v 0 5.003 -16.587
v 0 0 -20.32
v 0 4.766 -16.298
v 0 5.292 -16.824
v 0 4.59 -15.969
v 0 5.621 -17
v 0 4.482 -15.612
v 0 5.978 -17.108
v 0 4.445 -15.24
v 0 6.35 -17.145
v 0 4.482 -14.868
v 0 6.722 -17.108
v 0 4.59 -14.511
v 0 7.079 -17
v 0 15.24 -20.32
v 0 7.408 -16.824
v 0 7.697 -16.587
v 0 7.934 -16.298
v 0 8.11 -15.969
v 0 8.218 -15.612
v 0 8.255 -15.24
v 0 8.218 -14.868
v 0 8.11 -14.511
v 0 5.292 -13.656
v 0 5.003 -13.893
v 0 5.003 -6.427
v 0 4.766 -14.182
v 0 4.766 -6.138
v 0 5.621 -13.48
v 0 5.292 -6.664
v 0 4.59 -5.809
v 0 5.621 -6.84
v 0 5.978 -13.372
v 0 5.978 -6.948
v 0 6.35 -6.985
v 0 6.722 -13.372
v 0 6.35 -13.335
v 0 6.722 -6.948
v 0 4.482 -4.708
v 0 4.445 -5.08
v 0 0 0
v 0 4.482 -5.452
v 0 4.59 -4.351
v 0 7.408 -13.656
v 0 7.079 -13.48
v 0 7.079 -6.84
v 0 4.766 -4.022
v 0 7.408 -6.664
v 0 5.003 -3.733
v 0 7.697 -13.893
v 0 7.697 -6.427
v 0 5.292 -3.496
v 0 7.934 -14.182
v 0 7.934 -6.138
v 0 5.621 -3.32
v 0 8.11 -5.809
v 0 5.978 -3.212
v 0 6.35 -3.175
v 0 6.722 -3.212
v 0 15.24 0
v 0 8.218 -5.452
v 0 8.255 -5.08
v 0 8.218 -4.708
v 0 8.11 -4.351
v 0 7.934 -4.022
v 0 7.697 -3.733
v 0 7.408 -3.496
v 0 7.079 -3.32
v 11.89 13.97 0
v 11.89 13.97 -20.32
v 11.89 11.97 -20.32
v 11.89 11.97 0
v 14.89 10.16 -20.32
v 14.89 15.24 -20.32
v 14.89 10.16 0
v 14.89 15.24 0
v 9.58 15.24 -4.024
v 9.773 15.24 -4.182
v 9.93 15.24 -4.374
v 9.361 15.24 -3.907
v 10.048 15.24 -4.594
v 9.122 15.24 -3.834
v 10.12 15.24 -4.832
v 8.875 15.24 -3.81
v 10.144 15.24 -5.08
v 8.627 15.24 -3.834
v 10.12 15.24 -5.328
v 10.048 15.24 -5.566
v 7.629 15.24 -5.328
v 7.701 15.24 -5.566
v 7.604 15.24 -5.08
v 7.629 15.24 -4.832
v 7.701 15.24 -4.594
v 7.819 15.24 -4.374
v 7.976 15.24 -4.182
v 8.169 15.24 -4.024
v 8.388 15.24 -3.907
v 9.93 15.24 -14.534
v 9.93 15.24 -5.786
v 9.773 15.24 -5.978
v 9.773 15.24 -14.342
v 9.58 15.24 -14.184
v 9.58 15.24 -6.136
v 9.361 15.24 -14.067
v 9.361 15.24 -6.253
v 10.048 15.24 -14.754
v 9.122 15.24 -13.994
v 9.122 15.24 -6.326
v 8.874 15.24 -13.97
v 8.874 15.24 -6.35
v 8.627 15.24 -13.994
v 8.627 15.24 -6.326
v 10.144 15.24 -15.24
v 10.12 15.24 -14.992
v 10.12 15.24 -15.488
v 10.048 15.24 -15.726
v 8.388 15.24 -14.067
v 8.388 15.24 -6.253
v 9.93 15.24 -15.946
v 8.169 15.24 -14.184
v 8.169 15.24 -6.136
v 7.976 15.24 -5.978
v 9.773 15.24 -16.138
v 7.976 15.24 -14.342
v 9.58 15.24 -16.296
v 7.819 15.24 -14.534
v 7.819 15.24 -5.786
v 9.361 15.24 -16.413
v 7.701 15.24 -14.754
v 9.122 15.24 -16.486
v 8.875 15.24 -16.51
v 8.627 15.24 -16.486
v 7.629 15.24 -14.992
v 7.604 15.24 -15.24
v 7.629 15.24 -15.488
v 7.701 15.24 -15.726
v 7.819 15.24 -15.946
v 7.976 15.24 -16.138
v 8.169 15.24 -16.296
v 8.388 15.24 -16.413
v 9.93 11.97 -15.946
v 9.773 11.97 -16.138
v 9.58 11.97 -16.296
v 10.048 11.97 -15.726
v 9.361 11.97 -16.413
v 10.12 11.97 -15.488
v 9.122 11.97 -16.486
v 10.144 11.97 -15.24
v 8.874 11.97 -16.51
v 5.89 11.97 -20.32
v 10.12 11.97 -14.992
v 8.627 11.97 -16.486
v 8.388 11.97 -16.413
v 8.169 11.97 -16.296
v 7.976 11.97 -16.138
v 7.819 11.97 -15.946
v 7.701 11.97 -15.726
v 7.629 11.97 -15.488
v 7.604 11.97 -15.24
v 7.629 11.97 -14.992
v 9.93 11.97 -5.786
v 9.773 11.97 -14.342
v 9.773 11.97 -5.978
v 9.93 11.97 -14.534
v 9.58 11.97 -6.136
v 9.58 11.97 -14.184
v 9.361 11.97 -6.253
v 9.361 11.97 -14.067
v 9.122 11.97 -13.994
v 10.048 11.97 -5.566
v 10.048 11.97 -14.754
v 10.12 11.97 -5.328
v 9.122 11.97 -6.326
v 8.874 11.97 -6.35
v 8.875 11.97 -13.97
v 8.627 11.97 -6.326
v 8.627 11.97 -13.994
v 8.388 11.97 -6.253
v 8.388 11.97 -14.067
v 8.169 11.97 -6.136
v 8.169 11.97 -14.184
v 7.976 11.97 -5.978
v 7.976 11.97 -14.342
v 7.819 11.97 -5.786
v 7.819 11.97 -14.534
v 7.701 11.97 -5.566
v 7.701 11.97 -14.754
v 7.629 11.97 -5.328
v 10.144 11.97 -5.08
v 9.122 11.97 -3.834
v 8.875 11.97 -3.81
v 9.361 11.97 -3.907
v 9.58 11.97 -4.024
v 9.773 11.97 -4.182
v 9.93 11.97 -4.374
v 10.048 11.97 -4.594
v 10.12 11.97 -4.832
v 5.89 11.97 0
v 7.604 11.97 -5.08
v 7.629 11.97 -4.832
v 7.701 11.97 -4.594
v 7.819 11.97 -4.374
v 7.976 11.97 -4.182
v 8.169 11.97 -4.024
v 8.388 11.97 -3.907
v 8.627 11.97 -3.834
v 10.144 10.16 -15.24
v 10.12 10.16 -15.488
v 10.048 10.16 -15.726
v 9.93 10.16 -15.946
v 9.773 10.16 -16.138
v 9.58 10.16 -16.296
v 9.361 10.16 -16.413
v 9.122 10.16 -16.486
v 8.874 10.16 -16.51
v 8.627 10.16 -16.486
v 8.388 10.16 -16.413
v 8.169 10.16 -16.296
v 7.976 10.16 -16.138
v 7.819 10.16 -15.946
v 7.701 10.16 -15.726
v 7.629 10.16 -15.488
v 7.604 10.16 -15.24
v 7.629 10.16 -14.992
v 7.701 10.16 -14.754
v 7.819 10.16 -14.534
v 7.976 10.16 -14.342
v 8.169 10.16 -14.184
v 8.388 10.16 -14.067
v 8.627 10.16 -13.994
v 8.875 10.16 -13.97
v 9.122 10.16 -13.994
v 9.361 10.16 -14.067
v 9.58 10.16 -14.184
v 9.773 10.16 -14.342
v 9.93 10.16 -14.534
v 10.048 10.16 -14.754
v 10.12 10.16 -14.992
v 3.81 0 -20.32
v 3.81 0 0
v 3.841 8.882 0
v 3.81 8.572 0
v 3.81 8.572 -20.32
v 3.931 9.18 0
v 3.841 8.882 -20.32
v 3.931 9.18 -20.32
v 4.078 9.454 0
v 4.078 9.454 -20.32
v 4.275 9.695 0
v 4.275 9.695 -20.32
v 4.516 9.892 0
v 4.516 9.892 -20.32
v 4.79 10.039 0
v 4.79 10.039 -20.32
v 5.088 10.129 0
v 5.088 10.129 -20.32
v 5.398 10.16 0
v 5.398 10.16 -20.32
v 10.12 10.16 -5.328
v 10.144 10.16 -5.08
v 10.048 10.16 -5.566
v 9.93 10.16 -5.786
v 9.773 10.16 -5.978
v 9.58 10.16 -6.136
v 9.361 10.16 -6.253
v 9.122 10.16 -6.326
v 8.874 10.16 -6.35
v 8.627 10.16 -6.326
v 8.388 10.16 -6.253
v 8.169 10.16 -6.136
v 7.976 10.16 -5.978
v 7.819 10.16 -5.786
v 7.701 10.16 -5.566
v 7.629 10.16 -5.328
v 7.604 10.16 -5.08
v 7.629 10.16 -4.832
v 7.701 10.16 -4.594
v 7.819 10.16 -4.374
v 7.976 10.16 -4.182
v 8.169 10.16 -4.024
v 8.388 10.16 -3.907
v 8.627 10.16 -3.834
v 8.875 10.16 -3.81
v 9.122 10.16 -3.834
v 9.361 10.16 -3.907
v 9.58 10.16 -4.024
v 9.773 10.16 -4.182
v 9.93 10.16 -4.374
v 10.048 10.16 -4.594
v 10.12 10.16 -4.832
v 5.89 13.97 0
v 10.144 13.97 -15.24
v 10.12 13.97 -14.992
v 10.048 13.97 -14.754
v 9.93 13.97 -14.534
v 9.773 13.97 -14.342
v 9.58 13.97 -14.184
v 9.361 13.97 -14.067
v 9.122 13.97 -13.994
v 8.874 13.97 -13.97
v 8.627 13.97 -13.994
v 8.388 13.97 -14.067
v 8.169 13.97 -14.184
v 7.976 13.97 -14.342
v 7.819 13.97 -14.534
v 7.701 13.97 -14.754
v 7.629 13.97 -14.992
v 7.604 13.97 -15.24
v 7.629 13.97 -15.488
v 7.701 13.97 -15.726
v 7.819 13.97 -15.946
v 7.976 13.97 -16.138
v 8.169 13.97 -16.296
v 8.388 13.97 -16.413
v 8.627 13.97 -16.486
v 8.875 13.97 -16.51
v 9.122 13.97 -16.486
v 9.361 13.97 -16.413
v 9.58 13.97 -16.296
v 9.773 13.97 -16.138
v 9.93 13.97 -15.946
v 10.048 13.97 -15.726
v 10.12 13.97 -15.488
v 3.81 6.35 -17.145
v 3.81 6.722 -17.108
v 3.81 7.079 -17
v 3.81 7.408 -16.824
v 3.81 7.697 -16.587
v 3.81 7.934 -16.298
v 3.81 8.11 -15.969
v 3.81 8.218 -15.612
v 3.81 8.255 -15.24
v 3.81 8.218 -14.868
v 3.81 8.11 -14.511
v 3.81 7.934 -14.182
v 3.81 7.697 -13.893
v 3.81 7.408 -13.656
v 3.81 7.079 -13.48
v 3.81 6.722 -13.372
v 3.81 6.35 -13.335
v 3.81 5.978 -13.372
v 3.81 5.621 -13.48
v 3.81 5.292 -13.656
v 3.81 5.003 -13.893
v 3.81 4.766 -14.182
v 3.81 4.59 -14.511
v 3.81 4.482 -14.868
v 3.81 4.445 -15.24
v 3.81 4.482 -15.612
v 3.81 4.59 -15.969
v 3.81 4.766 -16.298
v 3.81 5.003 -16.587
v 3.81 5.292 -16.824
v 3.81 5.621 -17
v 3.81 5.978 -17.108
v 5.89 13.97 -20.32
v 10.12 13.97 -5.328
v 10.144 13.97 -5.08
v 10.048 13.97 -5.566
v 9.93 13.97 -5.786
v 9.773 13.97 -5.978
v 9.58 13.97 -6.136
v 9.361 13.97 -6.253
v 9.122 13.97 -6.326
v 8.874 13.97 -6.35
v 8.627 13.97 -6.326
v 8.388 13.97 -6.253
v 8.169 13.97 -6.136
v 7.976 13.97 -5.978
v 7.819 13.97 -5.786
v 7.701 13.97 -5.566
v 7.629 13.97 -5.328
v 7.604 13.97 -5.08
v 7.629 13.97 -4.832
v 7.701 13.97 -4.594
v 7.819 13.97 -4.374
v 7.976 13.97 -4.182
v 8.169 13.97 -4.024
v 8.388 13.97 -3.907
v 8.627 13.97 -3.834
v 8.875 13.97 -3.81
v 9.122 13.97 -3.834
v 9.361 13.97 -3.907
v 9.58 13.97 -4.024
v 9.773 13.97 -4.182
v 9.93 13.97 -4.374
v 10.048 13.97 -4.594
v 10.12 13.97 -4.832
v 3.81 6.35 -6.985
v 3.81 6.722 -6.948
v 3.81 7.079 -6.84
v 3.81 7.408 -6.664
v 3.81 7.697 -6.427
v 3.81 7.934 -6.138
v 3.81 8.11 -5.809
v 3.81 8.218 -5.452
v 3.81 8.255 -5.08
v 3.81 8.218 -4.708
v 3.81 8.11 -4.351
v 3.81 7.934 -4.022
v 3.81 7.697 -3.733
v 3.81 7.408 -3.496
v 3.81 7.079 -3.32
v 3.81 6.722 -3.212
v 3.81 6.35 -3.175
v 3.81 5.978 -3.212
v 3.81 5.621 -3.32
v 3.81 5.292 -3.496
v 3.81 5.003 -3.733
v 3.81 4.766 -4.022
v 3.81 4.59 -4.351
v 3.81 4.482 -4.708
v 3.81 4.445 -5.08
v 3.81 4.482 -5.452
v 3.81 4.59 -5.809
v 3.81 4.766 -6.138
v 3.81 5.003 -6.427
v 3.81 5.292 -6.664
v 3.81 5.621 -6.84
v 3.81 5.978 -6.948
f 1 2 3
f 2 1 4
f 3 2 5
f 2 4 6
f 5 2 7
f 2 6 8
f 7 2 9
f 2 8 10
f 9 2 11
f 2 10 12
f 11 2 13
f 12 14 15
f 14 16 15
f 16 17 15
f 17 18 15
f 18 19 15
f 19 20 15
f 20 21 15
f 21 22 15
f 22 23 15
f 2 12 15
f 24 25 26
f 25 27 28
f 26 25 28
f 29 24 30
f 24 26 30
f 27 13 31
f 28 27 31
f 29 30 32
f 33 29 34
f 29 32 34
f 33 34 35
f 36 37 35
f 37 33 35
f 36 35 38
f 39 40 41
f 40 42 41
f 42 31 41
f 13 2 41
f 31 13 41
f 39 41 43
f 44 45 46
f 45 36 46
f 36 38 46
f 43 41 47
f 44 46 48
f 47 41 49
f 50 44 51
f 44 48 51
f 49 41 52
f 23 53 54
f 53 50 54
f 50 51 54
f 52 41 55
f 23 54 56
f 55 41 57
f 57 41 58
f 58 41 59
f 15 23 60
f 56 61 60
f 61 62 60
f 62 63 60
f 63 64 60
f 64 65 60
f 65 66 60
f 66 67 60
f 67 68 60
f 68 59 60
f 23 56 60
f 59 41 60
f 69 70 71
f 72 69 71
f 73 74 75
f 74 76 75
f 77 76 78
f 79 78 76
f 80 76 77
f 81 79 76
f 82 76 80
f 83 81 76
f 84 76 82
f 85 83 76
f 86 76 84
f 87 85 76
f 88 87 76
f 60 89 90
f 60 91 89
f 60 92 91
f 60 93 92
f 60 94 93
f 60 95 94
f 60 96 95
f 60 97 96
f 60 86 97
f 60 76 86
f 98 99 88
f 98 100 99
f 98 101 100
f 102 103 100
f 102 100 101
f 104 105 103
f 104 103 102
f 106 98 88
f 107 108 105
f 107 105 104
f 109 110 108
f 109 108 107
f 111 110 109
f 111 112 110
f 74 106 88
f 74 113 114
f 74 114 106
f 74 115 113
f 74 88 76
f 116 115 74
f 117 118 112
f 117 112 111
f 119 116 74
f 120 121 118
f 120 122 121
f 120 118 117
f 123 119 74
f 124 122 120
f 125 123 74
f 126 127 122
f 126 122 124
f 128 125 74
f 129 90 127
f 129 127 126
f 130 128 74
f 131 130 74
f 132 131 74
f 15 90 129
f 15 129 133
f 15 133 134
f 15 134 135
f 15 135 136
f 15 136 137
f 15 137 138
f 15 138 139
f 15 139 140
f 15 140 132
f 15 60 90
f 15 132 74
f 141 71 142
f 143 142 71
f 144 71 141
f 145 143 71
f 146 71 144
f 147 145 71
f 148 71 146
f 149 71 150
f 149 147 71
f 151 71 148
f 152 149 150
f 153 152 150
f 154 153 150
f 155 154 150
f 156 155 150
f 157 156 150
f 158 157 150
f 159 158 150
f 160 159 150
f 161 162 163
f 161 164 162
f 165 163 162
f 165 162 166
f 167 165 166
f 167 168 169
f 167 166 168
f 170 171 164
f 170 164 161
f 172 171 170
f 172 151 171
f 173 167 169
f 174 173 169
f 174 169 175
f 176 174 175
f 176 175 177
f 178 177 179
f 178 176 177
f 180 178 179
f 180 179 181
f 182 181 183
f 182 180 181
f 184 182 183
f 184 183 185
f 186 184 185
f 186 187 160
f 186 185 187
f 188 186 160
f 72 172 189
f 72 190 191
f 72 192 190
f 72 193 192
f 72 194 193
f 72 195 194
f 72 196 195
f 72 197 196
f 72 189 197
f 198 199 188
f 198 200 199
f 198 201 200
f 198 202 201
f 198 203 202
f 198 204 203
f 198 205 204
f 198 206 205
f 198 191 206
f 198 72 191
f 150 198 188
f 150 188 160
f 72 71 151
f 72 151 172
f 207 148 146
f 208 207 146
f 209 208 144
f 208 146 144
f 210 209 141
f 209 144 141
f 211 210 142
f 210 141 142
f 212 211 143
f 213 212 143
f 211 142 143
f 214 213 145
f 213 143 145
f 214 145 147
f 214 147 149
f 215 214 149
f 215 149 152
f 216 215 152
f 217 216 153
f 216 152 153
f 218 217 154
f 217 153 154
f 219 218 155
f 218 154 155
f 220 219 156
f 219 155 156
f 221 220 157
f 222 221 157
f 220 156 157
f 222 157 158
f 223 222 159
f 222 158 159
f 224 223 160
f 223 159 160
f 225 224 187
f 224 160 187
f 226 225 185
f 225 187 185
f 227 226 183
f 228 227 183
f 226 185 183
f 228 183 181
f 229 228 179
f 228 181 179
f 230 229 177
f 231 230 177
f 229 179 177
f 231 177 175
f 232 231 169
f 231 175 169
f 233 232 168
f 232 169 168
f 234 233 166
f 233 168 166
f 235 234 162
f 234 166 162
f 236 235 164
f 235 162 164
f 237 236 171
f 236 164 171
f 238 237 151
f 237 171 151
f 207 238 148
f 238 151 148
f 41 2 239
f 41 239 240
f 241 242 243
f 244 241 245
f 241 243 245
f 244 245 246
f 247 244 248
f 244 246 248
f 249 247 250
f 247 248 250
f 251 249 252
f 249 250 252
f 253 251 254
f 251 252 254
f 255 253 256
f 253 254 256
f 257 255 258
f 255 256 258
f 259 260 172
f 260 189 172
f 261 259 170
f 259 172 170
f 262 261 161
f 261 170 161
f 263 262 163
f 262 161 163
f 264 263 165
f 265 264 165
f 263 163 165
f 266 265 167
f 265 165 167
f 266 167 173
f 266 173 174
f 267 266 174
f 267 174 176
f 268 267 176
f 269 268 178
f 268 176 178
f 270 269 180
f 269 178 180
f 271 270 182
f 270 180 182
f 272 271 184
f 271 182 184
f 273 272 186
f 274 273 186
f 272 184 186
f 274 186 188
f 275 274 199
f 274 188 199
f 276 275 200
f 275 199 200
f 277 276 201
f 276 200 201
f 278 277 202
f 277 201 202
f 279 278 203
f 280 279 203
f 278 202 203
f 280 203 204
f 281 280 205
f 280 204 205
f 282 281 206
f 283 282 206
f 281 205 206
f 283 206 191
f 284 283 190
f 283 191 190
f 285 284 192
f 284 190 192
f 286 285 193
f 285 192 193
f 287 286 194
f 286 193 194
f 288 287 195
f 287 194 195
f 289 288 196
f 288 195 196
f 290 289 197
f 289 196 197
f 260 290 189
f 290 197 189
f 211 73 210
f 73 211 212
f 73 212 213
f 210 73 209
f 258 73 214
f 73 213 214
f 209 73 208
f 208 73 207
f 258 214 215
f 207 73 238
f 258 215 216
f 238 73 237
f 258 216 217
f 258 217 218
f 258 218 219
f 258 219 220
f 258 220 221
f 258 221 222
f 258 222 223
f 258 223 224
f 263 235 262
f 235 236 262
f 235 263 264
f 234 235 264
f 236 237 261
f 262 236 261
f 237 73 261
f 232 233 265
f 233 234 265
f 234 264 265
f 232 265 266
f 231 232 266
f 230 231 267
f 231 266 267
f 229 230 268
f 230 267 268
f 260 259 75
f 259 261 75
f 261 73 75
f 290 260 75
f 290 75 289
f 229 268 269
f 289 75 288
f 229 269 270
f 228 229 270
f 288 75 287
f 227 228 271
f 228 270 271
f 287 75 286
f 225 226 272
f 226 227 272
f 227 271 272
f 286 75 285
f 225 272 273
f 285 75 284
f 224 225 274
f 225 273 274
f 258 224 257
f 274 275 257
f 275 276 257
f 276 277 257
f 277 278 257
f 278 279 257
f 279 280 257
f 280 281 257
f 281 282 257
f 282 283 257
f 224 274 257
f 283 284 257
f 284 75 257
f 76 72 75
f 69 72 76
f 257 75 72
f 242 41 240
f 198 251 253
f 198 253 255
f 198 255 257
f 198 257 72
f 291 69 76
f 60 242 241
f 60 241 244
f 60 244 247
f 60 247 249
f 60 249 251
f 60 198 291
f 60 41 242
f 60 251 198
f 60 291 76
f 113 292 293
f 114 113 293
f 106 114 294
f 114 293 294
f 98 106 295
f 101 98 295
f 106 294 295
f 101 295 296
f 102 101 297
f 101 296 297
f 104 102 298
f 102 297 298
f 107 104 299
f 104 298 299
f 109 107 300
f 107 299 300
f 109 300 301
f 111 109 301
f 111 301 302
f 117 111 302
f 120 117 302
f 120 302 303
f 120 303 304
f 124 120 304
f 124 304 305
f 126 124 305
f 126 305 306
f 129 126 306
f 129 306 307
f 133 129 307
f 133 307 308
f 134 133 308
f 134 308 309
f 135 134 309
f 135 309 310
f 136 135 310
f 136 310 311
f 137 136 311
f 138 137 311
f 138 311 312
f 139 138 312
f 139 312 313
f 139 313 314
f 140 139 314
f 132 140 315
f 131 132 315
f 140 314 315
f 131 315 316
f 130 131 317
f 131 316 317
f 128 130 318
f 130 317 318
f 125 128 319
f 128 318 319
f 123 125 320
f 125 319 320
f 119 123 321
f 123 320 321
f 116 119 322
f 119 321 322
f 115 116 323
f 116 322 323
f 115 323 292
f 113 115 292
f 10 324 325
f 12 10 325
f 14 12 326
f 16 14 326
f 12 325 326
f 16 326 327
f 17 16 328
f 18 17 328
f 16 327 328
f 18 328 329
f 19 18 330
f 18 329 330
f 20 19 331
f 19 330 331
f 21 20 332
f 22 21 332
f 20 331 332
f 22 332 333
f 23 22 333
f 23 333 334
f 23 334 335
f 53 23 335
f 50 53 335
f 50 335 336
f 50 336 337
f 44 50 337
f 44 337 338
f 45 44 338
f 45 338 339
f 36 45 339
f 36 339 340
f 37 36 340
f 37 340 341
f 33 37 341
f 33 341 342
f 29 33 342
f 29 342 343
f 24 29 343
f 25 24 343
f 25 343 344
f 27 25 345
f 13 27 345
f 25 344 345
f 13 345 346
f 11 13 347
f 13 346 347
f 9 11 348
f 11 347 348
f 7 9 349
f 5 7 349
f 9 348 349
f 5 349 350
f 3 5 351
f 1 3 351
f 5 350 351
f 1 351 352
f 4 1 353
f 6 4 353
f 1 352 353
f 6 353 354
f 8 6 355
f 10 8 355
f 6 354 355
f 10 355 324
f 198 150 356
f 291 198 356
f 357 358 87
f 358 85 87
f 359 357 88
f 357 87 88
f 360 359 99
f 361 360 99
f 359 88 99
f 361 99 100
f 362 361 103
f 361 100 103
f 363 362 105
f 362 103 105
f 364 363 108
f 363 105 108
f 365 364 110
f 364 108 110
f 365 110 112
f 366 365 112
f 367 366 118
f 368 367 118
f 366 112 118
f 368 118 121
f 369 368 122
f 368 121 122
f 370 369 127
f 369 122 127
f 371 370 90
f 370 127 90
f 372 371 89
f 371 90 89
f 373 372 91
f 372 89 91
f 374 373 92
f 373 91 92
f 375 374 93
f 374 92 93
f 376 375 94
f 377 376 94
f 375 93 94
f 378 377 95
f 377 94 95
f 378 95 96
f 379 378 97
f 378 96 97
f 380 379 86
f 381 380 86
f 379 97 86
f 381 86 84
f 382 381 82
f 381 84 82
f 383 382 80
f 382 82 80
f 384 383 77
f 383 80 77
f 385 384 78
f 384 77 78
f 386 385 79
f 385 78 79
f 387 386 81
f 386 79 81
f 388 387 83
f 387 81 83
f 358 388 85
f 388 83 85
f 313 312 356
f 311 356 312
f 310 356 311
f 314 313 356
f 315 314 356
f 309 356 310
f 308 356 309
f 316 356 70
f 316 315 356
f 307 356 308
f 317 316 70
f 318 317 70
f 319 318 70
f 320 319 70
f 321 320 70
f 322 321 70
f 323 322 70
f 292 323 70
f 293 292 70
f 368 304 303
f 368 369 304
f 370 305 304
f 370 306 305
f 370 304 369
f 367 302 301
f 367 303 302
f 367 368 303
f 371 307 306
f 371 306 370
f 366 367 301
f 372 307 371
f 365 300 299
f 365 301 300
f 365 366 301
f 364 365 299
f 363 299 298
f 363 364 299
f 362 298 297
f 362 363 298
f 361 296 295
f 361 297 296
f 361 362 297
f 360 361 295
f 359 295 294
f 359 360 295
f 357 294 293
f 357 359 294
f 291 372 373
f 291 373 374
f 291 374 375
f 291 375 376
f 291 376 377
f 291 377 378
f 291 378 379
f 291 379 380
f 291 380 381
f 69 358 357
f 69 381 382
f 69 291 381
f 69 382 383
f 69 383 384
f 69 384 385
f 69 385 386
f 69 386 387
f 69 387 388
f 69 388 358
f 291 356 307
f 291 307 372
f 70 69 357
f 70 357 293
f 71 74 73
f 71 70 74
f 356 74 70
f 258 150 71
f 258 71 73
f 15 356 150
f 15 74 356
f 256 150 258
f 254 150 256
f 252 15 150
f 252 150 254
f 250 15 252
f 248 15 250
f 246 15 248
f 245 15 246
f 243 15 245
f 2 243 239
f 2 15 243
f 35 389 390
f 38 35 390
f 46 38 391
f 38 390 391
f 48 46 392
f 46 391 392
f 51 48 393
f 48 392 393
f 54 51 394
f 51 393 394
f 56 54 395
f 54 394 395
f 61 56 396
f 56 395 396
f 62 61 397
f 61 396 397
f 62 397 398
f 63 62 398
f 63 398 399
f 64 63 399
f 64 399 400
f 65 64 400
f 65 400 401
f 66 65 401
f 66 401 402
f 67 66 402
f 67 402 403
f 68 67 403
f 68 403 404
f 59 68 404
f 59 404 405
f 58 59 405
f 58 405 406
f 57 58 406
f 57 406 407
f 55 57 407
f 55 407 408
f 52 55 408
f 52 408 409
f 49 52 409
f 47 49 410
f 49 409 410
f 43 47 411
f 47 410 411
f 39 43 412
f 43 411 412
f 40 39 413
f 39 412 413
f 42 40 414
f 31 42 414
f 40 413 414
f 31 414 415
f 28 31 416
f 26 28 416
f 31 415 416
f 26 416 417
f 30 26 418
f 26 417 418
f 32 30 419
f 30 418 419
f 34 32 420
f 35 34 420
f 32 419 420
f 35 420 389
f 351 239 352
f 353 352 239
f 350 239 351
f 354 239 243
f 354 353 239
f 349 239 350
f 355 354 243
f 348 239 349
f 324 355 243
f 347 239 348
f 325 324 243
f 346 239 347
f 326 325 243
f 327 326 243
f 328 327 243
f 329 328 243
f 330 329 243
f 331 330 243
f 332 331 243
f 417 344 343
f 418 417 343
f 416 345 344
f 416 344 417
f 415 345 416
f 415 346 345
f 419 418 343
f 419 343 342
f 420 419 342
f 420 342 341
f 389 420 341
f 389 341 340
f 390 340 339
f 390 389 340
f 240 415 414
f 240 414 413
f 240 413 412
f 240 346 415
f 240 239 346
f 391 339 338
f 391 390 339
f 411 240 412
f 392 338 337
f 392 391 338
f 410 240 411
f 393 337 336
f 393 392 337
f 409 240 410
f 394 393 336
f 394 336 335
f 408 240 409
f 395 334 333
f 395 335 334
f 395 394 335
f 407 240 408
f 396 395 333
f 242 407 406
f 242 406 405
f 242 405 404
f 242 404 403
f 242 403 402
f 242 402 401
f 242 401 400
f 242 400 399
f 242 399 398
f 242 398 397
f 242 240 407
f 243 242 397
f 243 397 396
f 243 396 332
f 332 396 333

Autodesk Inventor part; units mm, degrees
ref_plane "YZ Plane" through (0, 0, 0) normal (1, 0, 0) x (0, 1, 0)
ref_plane "XZ Plane" through (0, 0, 0) normal (0, 1, 0) x (-1, 0, 0)
ref_plane "XY Plane" through (0, 0, 0) normal (0, 0, 1) x (1, 0, 0)
sketch "Sketch1" plane through (0, 0, 0) normal (1, 0, 0) x (0, 1, 0)
  line L0 (0, 0) -> (15.24, 0)
  line L1 (15.24, 0) -> (15.24, -20.32)
  line L2 (15.24, -20.32) -> (0, -20.32)
  line L3 (0, -20.32) -> (0, 0)
  dimension "d0" = 15.24
  dimension "d1" = 20.32
extrude "Extrusion1" add sketch "Sketch1" along normal blind 3.81
sketch "Sketch2" plane through (0, 0, 0) normal (0, 0, 1) x (1, 0, 0)
  line L0 (3.81, 15.24) -> (8.89, 15.24)
  line L1 (8.89, 15.24) -> (14.89, 15.24)
  line L2 (14.89, 15.24) -> (14.89, 10.16)
  line L3 (14.89, 10.16) -> (3.81, 10.16)
  line L4 (3.81, 15.24) -> (3.81, 0) projected
  line L5 (8.89, 12.9701) -> (11.89, 12.9701)
  line L6 (11.89, 12.9701) -> (11.89, 11.9701)
  line L7 (11.89, 11.9701) -> (5.89, 11.9701)
  line L8 (5.89, 11.9701) -> (5.89, 12.9701)
  line L9 (5.89, 12.9701) -> (5.89, 13.9701)
  line L10 (5.89, 13.9701) -> (11.89, 13.9701)
  line L11 (11.89, 13.9701) -> (11.89, 12.9701)
  line L12 (3.81, 15.24) -> (3.81, 10.16)
  line L13 (0, 12.9701) -> (3.81, 12.9701)
  line L14 (5.89, 12.9701) -> (8.89, 12.9701)
  point P0 (0, 0)
  point P1 (0, 15.24)
  dimension "d4" = 8.89
  dimension "d5" = 6
  dimension "d6" = 5.08
  dimension "d7" = 8.89
  dimension "d8" = 3
  dimension "d9" = 1
  dimension "d10" = 6
  dimension "d11" = 1
extrude "Extrusion2" add sketch "Sketch2" against normal blind 20.32
sketch "Sketch3" plane through (5.89, 11.9701, 0) normal (0, 1, 0) x (1, 0, 0)
  line L0 (0, 0) -> (0, 5.08)
  line L1 (0, 0) -> (0, 20.32) projected
  line L2 (0, 5.08) -> (2.9845, 5.08)
  line L3 (6, 0) -> (6, 20.32) projected
  circle A0 centre (2.9845, 5.08) radius 1.27
  line L4 (-2.08, 0) -> (-2.08, 10.16)
  line L5 (-2.08, 0) -> (-2.08, 20.32) projected
  line L6 (-2.08, 10.16) -> (2.0052, 10.16)
  circle A1 centre (2.9845, 15.24) radius 1.27
  point P0 (-5.89, 0)
  dimension "d14" = 5.08
  dimension "d15" = 2.9845
  dimension "d16" = 2.54
  dimension "d17" = 10.16
extrude "Extrusion3" cut sketch "Sketch3" along normal mid plane 20.32
sketch "Sketch4" plane through (3.81, 0, 0) normal (1, 0, 0) x (0, 0, -1)
  line L0 (0, 0) -> (0, 6.35)
  line L1 (0, 10.16) -> (0, 0) projected
  line L2 (0, 6.35) -> (5.08, 6.35)
  circle A0 centre (5.08, 6.35) radius 1.905
  line L3 (0, 0) -> (10.16, 0)
  line L4 (0, 0) -> (20.32, 0) projected
  line L5 (10.16, 0) -> (10.16, 4.445)
  circle A1 centre (15.24, 6.35) radius 1.905
  dimension "d20" = 6.35
  dimension "d21" = 5.08
  dimension "d22" = 3.81
  dimension "d23" = 10.16
extrude "Extrusion4" cut sketch "Sketch4" against normal blind 20.32
fillet "Fillet1" radius 1.5875 1 edges at (3.81, 10.16, -10.16)
properties part number "ExtruderTimingBeltHolder"
